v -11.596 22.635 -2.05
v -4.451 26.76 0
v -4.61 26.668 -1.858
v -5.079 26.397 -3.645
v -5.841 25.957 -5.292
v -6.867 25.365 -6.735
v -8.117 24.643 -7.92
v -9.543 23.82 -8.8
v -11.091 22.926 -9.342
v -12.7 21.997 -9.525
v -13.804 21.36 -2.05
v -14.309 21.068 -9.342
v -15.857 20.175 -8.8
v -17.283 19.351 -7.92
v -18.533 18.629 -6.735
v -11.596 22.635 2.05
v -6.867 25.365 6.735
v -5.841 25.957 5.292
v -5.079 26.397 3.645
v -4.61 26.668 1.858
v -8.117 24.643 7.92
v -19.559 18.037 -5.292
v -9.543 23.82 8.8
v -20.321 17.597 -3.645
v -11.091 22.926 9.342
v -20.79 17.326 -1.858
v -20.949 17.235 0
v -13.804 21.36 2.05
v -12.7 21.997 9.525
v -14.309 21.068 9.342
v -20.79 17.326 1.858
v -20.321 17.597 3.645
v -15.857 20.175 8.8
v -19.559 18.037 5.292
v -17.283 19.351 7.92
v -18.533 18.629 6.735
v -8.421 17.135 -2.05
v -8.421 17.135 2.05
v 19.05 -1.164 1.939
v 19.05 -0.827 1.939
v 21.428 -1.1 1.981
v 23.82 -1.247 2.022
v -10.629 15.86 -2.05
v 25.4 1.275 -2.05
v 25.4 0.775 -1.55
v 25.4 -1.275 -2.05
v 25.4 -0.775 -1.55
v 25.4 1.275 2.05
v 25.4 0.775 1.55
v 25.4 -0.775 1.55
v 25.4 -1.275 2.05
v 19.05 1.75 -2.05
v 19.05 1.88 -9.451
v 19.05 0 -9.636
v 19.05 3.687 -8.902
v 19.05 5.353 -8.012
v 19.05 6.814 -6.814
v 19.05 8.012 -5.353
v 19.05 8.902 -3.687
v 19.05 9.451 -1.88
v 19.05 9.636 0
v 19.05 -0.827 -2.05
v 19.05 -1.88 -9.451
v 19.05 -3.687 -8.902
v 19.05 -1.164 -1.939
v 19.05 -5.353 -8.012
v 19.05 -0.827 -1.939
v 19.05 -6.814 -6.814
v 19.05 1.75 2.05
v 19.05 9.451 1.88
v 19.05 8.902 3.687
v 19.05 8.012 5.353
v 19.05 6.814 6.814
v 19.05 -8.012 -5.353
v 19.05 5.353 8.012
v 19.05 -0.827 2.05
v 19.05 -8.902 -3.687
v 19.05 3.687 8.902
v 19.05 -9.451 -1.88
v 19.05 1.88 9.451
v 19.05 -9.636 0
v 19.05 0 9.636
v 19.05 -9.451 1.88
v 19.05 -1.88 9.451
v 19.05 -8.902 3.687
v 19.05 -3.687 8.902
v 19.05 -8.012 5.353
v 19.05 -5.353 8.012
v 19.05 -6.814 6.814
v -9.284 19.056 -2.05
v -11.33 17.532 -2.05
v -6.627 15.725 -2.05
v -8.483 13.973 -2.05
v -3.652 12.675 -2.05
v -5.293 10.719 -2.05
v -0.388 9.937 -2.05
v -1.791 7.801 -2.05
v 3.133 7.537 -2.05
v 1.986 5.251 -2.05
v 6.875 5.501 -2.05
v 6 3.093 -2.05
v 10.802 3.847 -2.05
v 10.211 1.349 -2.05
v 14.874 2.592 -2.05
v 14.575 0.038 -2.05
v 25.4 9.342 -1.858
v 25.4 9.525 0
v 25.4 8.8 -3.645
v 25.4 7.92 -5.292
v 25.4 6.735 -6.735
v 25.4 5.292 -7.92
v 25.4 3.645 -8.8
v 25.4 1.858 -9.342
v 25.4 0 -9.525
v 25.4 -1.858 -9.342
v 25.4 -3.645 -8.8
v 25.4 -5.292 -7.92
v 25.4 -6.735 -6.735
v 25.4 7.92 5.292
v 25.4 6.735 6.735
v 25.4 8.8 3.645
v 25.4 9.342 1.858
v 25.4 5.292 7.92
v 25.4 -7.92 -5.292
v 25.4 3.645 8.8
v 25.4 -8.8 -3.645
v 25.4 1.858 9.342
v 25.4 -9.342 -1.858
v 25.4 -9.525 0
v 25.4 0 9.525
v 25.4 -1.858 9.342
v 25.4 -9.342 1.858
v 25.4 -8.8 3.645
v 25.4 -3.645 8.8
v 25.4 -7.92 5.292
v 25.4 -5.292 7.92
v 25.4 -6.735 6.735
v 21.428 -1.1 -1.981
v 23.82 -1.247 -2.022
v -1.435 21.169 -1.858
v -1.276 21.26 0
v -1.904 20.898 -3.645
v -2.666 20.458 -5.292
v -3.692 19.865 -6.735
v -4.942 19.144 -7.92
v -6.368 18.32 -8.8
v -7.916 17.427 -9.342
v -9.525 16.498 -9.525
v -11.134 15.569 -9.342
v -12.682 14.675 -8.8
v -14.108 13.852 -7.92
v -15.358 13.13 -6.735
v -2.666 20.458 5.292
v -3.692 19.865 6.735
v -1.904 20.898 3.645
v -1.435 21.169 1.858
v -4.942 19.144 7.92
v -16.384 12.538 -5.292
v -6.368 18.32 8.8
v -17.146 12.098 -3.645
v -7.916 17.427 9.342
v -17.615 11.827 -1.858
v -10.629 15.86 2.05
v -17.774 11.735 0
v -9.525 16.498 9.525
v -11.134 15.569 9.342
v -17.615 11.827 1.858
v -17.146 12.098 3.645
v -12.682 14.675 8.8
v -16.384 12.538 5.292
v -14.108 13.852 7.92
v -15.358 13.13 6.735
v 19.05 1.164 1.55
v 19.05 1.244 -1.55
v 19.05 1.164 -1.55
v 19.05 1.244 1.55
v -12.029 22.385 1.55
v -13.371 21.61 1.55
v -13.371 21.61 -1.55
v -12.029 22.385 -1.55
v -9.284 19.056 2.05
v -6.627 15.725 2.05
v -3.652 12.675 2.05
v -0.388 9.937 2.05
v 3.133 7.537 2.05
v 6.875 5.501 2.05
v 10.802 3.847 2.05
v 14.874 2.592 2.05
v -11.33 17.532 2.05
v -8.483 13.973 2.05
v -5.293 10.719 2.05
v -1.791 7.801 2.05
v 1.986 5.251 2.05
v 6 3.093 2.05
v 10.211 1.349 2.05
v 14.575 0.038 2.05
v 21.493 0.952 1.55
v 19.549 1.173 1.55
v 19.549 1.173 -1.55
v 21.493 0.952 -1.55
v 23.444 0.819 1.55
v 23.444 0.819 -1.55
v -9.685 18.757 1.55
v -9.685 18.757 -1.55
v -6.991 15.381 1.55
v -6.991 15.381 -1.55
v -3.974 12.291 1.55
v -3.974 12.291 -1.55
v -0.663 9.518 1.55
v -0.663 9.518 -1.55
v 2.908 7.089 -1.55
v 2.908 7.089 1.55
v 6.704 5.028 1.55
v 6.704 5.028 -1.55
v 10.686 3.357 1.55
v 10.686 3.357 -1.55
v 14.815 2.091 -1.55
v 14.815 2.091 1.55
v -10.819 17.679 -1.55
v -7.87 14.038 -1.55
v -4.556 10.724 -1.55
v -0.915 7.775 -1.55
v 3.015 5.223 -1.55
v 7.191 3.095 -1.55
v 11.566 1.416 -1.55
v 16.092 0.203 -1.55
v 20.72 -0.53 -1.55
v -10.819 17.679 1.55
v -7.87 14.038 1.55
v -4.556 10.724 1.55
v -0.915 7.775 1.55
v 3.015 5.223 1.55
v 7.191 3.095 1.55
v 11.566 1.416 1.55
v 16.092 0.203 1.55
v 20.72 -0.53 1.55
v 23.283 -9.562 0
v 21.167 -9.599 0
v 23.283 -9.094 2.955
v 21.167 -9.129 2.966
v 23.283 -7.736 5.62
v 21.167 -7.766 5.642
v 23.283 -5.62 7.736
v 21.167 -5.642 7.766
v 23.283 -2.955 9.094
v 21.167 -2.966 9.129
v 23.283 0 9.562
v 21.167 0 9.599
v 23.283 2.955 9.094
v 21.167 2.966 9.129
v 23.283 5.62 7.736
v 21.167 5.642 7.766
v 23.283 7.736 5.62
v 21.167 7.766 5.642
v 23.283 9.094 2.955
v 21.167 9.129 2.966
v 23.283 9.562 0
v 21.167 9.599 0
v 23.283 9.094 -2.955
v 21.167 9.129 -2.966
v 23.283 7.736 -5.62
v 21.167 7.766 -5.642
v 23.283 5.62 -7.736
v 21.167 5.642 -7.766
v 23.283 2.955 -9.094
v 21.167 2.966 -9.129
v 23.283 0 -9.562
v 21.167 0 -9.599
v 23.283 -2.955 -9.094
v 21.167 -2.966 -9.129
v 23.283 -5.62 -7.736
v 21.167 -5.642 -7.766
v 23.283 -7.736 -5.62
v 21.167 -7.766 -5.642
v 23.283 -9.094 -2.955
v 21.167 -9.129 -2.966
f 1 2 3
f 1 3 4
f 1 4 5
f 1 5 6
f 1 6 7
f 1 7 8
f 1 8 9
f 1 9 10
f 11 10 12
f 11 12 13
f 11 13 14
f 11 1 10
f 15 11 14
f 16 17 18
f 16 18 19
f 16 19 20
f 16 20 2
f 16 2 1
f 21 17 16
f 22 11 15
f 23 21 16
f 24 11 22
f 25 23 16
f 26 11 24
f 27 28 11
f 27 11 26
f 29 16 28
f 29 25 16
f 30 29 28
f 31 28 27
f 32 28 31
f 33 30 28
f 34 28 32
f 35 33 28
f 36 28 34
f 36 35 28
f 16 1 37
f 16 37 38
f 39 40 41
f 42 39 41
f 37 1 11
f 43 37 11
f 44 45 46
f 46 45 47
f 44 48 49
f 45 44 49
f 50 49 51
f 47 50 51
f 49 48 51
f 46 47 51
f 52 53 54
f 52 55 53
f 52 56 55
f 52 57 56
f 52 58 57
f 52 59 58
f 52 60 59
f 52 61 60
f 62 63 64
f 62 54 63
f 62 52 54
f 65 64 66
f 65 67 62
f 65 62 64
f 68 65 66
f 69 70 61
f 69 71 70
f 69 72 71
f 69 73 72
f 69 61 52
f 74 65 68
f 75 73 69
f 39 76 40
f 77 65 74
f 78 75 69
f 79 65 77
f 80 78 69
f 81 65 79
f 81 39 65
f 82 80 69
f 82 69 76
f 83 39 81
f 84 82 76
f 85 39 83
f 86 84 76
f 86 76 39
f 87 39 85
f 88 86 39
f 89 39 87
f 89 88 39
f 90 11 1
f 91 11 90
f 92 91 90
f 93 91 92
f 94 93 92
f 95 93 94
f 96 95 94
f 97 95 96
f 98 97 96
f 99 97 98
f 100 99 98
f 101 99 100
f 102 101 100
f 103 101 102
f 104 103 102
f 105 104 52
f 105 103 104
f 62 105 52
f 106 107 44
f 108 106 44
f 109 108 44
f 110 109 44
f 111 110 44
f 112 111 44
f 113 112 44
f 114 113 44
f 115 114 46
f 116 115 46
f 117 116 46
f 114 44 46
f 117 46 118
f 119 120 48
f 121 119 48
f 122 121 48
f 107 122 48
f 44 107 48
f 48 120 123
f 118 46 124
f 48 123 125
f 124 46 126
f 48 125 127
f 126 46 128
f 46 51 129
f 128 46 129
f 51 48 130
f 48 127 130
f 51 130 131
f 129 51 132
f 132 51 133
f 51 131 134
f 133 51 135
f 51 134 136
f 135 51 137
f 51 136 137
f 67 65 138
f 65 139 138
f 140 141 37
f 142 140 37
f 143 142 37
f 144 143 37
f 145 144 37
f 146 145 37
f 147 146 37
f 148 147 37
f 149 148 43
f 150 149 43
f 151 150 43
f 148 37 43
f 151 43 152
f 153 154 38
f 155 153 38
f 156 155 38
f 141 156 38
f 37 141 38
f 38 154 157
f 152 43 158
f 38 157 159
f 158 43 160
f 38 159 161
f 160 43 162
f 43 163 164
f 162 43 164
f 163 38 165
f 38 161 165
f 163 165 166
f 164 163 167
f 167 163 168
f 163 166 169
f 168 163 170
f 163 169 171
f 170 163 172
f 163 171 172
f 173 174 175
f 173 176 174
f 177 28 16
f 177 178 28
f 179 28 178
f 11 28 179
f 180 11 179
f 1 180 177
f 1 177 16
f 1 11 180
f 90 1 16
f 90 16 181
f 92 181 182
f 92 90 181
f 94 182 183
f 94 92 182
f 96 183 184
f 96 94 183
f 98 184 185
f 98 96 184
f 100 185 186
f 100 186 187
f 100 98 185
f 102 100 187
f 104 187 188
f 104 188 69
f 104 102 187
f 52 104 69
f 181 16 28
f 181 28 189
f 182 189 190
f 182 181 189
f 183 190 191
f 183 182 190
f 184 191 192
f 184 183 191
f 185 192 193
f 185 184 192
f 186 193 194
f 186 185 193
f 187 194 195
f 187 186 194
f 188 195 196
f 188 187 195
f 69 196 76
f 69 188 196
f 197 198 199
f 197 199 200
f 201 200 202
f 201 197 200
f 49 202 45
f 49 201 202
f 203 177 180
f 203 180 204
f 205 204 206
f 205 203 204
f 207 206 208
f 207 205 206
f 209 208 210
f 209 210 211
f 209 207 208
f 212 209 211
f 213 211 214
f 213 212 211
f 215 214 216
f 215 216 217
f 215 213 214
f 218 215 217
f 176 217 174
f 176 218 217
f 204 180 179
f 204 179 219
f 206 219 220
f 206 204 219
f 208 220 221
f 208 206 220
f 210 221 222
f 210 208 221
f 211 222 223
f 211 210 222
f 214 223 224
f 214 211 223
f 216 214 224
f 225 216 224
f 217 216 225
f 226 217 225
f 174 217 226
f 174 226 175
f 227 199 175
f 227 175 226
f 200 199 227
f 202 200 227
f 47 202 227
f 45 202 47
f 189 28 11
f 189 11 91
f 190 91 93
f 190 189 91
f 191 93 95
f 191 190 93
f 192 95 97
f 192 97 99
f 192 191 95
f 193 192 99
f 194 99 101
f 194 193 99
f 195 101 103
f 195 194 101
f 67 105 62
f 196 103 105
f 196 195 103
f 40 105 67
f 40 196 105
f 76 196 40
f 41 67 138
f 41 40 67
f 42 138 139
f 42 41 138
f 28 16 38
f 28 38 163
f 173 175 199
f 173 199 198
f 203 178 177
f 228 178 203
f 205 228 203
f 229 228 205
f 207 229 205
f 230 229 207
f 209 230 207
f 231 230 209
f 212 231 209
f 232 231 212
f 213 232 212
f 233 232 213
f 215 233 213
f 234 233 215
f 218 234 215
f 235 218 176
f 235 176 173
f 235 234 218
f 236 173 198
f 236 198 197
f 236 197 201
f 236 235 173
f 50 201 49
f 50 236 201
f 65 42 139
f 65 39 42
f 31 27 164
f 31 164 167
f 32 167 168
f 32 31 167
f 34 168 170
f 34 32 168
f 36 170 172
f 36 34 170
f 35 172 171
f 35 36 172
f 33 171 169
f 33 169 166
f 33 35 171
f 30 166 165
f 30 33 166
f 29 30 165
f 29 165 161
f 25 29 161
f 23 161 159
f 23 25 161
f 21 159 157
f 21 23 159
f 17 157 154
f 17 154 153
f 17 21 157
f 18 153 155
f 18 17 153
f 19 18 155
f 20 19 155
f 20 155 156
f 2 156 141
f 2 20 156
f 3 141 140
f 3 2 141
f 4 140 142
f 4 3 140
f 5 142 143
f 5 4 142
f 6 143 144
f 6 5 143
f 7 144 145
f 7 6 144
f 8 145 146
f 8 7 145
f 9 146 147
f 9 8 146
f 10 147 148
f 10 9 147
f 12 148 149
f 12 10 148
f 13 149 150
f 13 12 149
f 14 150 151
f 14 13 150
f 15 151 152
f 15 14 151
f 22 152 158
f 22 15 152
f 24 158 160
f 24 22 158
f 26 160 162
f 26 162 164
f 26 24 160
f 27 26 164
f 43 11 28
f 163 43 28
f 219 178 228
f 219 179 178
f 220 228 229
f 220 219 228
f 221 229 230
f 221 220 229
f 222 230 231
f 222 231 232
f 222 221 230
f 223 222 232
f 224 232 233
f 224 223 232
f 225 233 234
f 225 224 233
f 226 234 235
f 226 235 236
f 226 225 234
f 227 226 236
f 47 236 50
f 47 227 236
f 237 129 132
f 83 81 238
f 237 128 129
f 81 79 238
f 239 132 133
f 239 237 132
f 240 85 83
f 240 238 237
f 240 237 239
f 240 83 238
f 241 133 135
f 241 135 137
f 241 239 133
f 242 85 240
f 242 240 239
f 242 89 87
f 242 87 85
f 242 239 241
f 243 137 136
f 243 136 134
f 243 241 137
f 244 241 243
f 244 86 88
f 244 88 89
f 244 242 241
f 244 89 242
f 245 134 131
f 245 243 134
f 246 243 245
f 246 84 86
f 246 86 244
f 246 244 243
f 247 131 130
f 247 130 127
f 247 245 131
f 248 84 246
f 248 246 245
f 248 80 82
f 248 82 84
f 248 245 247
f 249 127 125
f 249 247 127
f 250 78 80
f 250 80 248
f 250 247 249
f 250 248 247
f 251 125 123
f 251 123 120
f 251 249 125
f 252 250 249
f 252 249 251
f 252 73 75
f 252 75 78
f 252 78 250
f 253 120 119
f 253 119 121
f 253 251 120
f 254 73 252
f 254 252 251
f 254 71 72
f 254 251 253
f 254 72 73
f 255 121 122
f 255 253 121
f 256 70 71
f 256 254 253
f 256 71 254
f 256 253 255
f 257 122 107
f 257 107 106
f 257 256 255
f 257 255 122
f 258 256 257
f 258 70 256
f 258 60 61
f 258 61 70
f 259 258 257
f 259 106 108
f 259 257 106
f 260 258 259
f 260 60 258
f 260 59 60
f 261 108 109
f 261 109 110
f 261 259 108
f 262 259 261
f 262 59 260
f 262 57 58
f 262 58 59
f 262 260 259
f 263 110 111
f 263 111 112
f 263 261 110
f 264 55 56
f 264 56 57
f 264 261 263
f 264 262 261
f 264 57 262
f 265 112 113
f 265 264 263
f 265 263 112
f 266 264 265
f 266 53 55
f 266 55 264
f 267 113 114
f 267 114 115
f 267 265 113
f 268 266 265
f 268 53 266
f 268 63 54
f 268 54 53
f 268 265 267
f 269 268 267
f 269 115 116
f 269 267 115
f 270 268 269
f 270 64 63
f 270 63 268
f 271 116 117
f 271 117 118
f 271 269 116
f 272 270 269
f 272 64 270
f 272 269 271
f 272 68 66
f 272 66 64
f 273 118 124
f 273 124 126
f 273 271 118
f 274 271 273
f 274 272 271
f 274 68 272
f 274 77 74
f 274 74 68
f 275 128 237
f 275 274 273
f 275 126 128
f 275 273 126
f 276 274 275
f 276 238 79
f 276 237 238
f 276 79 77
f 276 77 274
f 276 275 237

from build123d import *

# Parameters (mm, degrees)
F4_W     = 2.55
F4_H     = 4.1
F4_W_2   = 1.55
F4_H_2   = 3.1
F3_W     = 2.55
F3_H     = 4.1
F3_W_2   = 1.55
F3_H_2   = 3.1
F3_R     = 9.525
F7_DEPTH = 6.35
F4_R     = 9.525
F8_DEPTH = 6.35
F8_TAPER = -1


# Not quite as in the source:
# - a feature of the source that left no trace in its solid (it failed there, or was rolled back) is left out


with BuildPart() as f5:
    # F5: sweep along a path in F0
    with BuildLine(Plane.XY) as f5_path:
        ThreePointArc((-12.7, 21.9970452561), (3.4029547439, 5.8940905122), (25.4, 0))
    # F4 (on line) + F3 (on line) → F5 (sweep)
    with BuildSketch(Plane(origin=(25.4, 0, 0), x_dir=(0, -1, 0), z_dir=(-1, 0, 0))):
        Rectangle(F4_W, F4_H)
        Rectangle(F4_W_2, F4_H_2, mode=Mode.SUBTRACT)
    with BuildSketch(Plane(origin=(-12.7, 21.9970452561, 0), x_dir=(-0.8660254038, -0.5, 0), z_dir=(-0.5, 0.8660254038, 0))):
        Rectangle(F3_W, F3_H)
        Rectangle(F3_W_2, F3_H_2, mode=Mode.SUBTRACT)
    sweep(path=f5_path.line)

    # F4 (on line) → F8 (join)
    with BuildSketch(Plane(origin=(25.4, 0, 0), x_dir=(0, -1, 0), z_dir=(-1, 0, 0))):
        Circle(F4_R)
        Rectangle(F4_W, F4_H, mode=Mode.SUBTRACT)
    extrude(amount=F8_DEPTH, taper=F8_TAPER)


with BuildPart() as f7:
    # F3 (on line) → F7 (new body)
    with BuildSketch(Plane(origin=(-12.7, 21.9970452561, 0), x_dir=(-0.8660254038, -0.5, 0), z_dir=(-0.5, 0.8660254038, 0))):
        Circle(F3_R)
        Rectangle(F3_W, F3_H, mode=Mode.SUBTRACT)
    extrude(amount=-F7_DEPTH)


solid = Compound([f5.part, f7.part])
